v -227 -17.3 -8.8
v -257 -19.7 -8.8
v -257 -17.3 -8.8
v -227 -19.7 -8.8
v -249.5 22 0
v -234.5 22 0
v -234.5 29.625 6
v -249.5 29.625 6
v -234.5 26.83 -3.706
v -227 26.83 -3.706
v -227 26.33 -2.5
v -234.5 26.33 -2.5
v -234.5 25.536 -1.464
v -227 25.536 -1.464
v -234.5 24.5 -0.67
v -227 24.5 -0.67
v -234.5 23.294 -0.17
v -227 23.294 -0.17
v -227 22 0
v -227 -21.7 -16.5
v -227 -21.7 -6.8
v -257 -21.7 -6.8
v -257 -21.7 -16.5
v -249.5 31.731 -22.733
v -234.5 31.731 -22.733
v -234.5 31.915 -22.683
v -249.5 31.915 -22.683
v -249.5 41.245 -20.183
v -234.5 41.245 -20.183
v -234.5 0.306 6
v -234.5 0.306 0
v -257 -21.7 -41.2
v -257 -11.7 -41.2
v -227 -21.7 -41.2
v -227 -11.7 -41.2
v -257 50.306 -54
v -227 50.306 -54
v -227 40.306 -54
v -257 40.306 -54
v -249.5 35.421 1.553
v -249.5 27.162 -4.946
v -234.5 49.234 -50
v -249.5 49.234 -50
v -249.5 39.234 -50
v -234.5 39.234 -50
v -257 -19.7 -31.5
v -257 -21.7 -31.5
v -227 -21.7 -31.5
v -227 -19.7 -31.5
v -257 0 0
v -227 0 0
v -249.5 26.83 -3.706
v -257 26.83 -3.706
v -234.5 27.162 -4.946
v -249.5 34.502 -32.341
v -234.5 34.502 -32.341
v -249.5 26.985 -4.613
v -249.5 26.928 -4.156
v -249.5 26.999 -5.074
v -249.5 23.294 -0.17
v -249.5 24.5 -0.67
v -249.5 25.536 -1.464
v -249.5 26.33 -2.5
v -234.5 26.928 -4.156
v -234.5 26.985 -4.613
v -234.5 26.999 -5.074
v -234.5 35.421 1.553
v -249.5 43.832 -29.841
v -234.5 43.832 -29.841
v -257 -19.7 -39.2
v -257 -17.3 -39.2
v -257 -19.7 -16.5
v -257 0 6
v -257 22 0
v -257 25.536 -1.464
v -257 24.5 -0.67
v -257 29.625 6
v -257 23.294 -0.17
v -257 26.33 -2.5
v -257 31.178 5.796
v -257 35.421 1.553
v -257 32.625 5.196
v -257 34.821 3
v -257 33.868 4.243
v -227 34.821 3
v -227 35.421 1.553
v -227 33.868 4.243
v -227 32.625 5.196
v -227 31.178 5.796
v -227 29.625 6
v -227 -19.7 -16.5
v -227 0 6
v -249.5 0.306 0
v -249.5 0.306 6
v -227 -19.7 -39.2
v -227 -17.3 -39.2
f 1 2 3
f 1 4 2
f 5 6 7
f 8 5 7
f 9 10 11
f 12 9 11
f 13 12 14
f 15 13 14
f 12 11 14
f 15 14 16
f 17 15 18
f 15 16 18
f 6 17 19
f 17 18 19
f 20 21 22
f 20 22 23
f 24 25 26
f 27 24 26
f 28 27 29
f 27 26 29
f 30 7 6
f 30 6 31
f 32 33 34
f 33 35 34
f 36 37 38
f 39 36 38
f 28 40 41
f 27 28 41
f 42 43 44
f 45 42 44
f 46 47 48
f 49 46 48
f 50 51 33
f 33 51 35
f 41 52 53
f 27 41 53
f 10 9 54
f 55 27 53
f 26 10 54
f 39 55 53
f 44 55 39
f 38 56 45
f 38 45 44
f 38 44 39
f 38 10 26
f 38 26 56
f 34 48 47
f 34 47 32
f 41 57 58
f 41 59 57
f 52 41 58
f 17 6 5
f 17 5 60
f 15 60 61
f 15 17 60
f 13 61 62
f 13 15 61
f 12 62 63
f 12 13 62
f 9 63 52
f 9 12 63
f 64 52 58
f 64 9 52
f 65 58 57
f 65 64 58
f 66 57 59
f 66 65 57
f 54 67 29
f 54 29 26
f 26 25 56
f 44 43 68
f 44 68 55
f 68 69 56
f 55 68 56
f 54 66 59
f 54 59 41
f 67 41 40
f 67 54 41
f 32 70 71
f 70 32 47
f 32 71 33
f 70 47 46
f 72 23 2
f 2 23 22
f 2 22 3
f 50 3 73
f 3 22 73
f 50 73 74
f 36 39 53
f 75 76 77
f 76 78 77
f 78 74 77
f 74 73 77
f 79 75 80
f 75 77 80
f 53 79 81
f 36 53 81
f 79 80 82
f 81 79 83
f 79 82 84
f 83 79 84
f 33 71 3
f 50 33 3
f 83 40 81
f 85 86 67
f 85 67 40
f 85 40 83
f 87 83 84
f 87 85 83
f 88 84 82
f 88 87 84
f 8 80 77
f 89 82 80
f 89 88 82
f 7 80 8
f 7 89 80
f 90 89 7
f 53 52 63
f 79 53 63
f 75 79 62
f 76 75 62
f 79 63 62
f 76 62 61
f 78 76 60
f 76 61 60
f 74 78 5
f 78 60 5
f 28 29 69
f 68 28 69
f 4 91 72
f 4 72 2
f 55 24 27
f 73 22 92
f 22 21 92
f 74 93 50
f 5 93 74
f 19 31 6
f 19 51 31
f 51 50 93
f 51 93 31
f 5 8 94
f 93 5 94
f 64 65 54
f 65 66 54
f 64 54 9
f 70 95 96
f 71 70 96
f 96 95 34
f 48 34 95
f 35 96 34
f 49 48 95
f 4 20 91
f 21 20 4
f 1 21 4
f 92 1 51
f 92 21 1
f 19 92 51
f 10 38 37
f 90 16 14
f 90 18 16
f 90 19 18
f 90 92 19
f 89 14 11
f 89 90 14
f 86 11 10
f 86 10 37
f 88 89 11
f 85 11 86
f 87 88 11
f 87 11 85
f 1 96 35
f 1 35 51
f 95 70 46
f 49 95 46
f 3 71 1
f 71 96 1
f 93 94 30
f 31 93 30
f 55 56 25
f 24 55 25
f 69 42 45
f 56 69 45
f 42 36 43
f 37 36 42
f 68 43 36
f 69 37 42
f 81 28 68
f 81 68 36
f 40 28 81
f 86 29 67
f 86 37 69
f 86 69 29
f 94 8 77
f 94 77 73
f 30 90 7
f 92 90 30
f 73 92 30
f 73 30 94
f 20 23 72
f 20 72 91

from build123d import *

# Parameters (mm, degrees)
SKETCH037_W     = 2.4
SKETCH037_H     = 30.4
PAD019_DEPTH    = 15
SKETCH038_W     = 15
SKETCH038_H     = 30
POCKET018_DEPTH = 4
SKETCH039_W     = 50
SKETCH039_H     = 15
POCKET019_DEPTH = 56
PAD022_DEPTH    = 15


with BuildPart() as part:
    # Sketch037 → Pad019 (new body, symmetric)
    with BuildSketch(Plane.YZ):
        with BuildLine():
            Line((0, 0), (22, 0))
            ThreePointArc((26.8296291314, -3.7059047745), (25.043807145, -1.0332332985), (22, 0))
            Line((26.8296291314, -3.7059047745), (40.3058913312, -54))
            Line((50.3058913312, -54), (40.3058913312, -54))
            Line((50.3058913312, -54), (35.4205328152, 1.5529142706))
            ThreePointArc((35.4205328152, 1.5529142706), (33.2775464315, 4.7601200417), (29.6249778574, 6))
            Line((29.6249778574, 6), (0, 6))
            Line((-21.7, -6.8), (0, 6))
            Line((-21.7, -6.8), (-21.7, -41.2))
            Line((-11.7, -41.2), (-21.7, -41.2))
            Line((0, 0), (-11.7, -41.2))
        make_face()
        with Locations((-18.5, -24)):
            Rectangle(SKETCH037_W, SKETCH037_H, mode=Mode.SUBTRACT)
    extrude(amount=PAD019_DEPTH, both=True)

    # Sketch038 (on Face10 of Pad019) → Pocket018 (cut)
    with BuildSketch(Plane(origin=(0, -21.7, 0), x_dir=(0, 0, -1), z_dir=(0, -1, 0))):
        with Locations((24, 0)):
            Rectangle(SKETCH038_W, SKETCH038_H)
    extrude(amount=-POCKET018_DEPTH, mode=Mode.SUBTRACT)

    # Sketch039 (on Face17 of Pocket018) → Pocket019 (cut)
    with BuildSketch(Plane(origin=(0, 0, 6), x_dir=(0, -1, 0), z_dir=(0, 0, 1))):
        with Locations((-25.3058913312, 0)):
            Rectangle(SKETCH039_W, SKETCH039_H)
    extrude(amount=-POCKET019_DEPTH, mode=Mode.SUBTRACT)

    # Sketch043 (on Face9 of Pocket019) → Pad022 (join)
    with BuildSketch(Plane(origin=(7.5, 0, 0), x_dir=(0, 1, 0), z_dir=(-1, 0, 0))):
        Polygon((34.5023642209, 32.3409419612), (31.7311897424, 22.7325814346), (41.2447676172, 20.1834259259), (43.8324912398, 29.8409419612), align=None)
        with BuildLine():
            Line((22, 0), (29.6249778574, -6))
            ThreePointArc((29.6249778574, -6), (33.2775464315, -4.7601200417), (35.4205328152, -1.5529142706))
            Line((26.9994594018, 5.0735233958), (35.4205328152, -1.5529142706))
            ThreePointArc((22, 0), (25.561433488, 1.4905568091), (26.9994594018, 5.0735233958))
        make_face()
    extrude(amount=PAD022_DEPTH)


with BuildPart() as part_1:
    # Body016 placement: moved
    add(part.part.moved(Location((-242, 0, 0))))


solid = part_1.part
